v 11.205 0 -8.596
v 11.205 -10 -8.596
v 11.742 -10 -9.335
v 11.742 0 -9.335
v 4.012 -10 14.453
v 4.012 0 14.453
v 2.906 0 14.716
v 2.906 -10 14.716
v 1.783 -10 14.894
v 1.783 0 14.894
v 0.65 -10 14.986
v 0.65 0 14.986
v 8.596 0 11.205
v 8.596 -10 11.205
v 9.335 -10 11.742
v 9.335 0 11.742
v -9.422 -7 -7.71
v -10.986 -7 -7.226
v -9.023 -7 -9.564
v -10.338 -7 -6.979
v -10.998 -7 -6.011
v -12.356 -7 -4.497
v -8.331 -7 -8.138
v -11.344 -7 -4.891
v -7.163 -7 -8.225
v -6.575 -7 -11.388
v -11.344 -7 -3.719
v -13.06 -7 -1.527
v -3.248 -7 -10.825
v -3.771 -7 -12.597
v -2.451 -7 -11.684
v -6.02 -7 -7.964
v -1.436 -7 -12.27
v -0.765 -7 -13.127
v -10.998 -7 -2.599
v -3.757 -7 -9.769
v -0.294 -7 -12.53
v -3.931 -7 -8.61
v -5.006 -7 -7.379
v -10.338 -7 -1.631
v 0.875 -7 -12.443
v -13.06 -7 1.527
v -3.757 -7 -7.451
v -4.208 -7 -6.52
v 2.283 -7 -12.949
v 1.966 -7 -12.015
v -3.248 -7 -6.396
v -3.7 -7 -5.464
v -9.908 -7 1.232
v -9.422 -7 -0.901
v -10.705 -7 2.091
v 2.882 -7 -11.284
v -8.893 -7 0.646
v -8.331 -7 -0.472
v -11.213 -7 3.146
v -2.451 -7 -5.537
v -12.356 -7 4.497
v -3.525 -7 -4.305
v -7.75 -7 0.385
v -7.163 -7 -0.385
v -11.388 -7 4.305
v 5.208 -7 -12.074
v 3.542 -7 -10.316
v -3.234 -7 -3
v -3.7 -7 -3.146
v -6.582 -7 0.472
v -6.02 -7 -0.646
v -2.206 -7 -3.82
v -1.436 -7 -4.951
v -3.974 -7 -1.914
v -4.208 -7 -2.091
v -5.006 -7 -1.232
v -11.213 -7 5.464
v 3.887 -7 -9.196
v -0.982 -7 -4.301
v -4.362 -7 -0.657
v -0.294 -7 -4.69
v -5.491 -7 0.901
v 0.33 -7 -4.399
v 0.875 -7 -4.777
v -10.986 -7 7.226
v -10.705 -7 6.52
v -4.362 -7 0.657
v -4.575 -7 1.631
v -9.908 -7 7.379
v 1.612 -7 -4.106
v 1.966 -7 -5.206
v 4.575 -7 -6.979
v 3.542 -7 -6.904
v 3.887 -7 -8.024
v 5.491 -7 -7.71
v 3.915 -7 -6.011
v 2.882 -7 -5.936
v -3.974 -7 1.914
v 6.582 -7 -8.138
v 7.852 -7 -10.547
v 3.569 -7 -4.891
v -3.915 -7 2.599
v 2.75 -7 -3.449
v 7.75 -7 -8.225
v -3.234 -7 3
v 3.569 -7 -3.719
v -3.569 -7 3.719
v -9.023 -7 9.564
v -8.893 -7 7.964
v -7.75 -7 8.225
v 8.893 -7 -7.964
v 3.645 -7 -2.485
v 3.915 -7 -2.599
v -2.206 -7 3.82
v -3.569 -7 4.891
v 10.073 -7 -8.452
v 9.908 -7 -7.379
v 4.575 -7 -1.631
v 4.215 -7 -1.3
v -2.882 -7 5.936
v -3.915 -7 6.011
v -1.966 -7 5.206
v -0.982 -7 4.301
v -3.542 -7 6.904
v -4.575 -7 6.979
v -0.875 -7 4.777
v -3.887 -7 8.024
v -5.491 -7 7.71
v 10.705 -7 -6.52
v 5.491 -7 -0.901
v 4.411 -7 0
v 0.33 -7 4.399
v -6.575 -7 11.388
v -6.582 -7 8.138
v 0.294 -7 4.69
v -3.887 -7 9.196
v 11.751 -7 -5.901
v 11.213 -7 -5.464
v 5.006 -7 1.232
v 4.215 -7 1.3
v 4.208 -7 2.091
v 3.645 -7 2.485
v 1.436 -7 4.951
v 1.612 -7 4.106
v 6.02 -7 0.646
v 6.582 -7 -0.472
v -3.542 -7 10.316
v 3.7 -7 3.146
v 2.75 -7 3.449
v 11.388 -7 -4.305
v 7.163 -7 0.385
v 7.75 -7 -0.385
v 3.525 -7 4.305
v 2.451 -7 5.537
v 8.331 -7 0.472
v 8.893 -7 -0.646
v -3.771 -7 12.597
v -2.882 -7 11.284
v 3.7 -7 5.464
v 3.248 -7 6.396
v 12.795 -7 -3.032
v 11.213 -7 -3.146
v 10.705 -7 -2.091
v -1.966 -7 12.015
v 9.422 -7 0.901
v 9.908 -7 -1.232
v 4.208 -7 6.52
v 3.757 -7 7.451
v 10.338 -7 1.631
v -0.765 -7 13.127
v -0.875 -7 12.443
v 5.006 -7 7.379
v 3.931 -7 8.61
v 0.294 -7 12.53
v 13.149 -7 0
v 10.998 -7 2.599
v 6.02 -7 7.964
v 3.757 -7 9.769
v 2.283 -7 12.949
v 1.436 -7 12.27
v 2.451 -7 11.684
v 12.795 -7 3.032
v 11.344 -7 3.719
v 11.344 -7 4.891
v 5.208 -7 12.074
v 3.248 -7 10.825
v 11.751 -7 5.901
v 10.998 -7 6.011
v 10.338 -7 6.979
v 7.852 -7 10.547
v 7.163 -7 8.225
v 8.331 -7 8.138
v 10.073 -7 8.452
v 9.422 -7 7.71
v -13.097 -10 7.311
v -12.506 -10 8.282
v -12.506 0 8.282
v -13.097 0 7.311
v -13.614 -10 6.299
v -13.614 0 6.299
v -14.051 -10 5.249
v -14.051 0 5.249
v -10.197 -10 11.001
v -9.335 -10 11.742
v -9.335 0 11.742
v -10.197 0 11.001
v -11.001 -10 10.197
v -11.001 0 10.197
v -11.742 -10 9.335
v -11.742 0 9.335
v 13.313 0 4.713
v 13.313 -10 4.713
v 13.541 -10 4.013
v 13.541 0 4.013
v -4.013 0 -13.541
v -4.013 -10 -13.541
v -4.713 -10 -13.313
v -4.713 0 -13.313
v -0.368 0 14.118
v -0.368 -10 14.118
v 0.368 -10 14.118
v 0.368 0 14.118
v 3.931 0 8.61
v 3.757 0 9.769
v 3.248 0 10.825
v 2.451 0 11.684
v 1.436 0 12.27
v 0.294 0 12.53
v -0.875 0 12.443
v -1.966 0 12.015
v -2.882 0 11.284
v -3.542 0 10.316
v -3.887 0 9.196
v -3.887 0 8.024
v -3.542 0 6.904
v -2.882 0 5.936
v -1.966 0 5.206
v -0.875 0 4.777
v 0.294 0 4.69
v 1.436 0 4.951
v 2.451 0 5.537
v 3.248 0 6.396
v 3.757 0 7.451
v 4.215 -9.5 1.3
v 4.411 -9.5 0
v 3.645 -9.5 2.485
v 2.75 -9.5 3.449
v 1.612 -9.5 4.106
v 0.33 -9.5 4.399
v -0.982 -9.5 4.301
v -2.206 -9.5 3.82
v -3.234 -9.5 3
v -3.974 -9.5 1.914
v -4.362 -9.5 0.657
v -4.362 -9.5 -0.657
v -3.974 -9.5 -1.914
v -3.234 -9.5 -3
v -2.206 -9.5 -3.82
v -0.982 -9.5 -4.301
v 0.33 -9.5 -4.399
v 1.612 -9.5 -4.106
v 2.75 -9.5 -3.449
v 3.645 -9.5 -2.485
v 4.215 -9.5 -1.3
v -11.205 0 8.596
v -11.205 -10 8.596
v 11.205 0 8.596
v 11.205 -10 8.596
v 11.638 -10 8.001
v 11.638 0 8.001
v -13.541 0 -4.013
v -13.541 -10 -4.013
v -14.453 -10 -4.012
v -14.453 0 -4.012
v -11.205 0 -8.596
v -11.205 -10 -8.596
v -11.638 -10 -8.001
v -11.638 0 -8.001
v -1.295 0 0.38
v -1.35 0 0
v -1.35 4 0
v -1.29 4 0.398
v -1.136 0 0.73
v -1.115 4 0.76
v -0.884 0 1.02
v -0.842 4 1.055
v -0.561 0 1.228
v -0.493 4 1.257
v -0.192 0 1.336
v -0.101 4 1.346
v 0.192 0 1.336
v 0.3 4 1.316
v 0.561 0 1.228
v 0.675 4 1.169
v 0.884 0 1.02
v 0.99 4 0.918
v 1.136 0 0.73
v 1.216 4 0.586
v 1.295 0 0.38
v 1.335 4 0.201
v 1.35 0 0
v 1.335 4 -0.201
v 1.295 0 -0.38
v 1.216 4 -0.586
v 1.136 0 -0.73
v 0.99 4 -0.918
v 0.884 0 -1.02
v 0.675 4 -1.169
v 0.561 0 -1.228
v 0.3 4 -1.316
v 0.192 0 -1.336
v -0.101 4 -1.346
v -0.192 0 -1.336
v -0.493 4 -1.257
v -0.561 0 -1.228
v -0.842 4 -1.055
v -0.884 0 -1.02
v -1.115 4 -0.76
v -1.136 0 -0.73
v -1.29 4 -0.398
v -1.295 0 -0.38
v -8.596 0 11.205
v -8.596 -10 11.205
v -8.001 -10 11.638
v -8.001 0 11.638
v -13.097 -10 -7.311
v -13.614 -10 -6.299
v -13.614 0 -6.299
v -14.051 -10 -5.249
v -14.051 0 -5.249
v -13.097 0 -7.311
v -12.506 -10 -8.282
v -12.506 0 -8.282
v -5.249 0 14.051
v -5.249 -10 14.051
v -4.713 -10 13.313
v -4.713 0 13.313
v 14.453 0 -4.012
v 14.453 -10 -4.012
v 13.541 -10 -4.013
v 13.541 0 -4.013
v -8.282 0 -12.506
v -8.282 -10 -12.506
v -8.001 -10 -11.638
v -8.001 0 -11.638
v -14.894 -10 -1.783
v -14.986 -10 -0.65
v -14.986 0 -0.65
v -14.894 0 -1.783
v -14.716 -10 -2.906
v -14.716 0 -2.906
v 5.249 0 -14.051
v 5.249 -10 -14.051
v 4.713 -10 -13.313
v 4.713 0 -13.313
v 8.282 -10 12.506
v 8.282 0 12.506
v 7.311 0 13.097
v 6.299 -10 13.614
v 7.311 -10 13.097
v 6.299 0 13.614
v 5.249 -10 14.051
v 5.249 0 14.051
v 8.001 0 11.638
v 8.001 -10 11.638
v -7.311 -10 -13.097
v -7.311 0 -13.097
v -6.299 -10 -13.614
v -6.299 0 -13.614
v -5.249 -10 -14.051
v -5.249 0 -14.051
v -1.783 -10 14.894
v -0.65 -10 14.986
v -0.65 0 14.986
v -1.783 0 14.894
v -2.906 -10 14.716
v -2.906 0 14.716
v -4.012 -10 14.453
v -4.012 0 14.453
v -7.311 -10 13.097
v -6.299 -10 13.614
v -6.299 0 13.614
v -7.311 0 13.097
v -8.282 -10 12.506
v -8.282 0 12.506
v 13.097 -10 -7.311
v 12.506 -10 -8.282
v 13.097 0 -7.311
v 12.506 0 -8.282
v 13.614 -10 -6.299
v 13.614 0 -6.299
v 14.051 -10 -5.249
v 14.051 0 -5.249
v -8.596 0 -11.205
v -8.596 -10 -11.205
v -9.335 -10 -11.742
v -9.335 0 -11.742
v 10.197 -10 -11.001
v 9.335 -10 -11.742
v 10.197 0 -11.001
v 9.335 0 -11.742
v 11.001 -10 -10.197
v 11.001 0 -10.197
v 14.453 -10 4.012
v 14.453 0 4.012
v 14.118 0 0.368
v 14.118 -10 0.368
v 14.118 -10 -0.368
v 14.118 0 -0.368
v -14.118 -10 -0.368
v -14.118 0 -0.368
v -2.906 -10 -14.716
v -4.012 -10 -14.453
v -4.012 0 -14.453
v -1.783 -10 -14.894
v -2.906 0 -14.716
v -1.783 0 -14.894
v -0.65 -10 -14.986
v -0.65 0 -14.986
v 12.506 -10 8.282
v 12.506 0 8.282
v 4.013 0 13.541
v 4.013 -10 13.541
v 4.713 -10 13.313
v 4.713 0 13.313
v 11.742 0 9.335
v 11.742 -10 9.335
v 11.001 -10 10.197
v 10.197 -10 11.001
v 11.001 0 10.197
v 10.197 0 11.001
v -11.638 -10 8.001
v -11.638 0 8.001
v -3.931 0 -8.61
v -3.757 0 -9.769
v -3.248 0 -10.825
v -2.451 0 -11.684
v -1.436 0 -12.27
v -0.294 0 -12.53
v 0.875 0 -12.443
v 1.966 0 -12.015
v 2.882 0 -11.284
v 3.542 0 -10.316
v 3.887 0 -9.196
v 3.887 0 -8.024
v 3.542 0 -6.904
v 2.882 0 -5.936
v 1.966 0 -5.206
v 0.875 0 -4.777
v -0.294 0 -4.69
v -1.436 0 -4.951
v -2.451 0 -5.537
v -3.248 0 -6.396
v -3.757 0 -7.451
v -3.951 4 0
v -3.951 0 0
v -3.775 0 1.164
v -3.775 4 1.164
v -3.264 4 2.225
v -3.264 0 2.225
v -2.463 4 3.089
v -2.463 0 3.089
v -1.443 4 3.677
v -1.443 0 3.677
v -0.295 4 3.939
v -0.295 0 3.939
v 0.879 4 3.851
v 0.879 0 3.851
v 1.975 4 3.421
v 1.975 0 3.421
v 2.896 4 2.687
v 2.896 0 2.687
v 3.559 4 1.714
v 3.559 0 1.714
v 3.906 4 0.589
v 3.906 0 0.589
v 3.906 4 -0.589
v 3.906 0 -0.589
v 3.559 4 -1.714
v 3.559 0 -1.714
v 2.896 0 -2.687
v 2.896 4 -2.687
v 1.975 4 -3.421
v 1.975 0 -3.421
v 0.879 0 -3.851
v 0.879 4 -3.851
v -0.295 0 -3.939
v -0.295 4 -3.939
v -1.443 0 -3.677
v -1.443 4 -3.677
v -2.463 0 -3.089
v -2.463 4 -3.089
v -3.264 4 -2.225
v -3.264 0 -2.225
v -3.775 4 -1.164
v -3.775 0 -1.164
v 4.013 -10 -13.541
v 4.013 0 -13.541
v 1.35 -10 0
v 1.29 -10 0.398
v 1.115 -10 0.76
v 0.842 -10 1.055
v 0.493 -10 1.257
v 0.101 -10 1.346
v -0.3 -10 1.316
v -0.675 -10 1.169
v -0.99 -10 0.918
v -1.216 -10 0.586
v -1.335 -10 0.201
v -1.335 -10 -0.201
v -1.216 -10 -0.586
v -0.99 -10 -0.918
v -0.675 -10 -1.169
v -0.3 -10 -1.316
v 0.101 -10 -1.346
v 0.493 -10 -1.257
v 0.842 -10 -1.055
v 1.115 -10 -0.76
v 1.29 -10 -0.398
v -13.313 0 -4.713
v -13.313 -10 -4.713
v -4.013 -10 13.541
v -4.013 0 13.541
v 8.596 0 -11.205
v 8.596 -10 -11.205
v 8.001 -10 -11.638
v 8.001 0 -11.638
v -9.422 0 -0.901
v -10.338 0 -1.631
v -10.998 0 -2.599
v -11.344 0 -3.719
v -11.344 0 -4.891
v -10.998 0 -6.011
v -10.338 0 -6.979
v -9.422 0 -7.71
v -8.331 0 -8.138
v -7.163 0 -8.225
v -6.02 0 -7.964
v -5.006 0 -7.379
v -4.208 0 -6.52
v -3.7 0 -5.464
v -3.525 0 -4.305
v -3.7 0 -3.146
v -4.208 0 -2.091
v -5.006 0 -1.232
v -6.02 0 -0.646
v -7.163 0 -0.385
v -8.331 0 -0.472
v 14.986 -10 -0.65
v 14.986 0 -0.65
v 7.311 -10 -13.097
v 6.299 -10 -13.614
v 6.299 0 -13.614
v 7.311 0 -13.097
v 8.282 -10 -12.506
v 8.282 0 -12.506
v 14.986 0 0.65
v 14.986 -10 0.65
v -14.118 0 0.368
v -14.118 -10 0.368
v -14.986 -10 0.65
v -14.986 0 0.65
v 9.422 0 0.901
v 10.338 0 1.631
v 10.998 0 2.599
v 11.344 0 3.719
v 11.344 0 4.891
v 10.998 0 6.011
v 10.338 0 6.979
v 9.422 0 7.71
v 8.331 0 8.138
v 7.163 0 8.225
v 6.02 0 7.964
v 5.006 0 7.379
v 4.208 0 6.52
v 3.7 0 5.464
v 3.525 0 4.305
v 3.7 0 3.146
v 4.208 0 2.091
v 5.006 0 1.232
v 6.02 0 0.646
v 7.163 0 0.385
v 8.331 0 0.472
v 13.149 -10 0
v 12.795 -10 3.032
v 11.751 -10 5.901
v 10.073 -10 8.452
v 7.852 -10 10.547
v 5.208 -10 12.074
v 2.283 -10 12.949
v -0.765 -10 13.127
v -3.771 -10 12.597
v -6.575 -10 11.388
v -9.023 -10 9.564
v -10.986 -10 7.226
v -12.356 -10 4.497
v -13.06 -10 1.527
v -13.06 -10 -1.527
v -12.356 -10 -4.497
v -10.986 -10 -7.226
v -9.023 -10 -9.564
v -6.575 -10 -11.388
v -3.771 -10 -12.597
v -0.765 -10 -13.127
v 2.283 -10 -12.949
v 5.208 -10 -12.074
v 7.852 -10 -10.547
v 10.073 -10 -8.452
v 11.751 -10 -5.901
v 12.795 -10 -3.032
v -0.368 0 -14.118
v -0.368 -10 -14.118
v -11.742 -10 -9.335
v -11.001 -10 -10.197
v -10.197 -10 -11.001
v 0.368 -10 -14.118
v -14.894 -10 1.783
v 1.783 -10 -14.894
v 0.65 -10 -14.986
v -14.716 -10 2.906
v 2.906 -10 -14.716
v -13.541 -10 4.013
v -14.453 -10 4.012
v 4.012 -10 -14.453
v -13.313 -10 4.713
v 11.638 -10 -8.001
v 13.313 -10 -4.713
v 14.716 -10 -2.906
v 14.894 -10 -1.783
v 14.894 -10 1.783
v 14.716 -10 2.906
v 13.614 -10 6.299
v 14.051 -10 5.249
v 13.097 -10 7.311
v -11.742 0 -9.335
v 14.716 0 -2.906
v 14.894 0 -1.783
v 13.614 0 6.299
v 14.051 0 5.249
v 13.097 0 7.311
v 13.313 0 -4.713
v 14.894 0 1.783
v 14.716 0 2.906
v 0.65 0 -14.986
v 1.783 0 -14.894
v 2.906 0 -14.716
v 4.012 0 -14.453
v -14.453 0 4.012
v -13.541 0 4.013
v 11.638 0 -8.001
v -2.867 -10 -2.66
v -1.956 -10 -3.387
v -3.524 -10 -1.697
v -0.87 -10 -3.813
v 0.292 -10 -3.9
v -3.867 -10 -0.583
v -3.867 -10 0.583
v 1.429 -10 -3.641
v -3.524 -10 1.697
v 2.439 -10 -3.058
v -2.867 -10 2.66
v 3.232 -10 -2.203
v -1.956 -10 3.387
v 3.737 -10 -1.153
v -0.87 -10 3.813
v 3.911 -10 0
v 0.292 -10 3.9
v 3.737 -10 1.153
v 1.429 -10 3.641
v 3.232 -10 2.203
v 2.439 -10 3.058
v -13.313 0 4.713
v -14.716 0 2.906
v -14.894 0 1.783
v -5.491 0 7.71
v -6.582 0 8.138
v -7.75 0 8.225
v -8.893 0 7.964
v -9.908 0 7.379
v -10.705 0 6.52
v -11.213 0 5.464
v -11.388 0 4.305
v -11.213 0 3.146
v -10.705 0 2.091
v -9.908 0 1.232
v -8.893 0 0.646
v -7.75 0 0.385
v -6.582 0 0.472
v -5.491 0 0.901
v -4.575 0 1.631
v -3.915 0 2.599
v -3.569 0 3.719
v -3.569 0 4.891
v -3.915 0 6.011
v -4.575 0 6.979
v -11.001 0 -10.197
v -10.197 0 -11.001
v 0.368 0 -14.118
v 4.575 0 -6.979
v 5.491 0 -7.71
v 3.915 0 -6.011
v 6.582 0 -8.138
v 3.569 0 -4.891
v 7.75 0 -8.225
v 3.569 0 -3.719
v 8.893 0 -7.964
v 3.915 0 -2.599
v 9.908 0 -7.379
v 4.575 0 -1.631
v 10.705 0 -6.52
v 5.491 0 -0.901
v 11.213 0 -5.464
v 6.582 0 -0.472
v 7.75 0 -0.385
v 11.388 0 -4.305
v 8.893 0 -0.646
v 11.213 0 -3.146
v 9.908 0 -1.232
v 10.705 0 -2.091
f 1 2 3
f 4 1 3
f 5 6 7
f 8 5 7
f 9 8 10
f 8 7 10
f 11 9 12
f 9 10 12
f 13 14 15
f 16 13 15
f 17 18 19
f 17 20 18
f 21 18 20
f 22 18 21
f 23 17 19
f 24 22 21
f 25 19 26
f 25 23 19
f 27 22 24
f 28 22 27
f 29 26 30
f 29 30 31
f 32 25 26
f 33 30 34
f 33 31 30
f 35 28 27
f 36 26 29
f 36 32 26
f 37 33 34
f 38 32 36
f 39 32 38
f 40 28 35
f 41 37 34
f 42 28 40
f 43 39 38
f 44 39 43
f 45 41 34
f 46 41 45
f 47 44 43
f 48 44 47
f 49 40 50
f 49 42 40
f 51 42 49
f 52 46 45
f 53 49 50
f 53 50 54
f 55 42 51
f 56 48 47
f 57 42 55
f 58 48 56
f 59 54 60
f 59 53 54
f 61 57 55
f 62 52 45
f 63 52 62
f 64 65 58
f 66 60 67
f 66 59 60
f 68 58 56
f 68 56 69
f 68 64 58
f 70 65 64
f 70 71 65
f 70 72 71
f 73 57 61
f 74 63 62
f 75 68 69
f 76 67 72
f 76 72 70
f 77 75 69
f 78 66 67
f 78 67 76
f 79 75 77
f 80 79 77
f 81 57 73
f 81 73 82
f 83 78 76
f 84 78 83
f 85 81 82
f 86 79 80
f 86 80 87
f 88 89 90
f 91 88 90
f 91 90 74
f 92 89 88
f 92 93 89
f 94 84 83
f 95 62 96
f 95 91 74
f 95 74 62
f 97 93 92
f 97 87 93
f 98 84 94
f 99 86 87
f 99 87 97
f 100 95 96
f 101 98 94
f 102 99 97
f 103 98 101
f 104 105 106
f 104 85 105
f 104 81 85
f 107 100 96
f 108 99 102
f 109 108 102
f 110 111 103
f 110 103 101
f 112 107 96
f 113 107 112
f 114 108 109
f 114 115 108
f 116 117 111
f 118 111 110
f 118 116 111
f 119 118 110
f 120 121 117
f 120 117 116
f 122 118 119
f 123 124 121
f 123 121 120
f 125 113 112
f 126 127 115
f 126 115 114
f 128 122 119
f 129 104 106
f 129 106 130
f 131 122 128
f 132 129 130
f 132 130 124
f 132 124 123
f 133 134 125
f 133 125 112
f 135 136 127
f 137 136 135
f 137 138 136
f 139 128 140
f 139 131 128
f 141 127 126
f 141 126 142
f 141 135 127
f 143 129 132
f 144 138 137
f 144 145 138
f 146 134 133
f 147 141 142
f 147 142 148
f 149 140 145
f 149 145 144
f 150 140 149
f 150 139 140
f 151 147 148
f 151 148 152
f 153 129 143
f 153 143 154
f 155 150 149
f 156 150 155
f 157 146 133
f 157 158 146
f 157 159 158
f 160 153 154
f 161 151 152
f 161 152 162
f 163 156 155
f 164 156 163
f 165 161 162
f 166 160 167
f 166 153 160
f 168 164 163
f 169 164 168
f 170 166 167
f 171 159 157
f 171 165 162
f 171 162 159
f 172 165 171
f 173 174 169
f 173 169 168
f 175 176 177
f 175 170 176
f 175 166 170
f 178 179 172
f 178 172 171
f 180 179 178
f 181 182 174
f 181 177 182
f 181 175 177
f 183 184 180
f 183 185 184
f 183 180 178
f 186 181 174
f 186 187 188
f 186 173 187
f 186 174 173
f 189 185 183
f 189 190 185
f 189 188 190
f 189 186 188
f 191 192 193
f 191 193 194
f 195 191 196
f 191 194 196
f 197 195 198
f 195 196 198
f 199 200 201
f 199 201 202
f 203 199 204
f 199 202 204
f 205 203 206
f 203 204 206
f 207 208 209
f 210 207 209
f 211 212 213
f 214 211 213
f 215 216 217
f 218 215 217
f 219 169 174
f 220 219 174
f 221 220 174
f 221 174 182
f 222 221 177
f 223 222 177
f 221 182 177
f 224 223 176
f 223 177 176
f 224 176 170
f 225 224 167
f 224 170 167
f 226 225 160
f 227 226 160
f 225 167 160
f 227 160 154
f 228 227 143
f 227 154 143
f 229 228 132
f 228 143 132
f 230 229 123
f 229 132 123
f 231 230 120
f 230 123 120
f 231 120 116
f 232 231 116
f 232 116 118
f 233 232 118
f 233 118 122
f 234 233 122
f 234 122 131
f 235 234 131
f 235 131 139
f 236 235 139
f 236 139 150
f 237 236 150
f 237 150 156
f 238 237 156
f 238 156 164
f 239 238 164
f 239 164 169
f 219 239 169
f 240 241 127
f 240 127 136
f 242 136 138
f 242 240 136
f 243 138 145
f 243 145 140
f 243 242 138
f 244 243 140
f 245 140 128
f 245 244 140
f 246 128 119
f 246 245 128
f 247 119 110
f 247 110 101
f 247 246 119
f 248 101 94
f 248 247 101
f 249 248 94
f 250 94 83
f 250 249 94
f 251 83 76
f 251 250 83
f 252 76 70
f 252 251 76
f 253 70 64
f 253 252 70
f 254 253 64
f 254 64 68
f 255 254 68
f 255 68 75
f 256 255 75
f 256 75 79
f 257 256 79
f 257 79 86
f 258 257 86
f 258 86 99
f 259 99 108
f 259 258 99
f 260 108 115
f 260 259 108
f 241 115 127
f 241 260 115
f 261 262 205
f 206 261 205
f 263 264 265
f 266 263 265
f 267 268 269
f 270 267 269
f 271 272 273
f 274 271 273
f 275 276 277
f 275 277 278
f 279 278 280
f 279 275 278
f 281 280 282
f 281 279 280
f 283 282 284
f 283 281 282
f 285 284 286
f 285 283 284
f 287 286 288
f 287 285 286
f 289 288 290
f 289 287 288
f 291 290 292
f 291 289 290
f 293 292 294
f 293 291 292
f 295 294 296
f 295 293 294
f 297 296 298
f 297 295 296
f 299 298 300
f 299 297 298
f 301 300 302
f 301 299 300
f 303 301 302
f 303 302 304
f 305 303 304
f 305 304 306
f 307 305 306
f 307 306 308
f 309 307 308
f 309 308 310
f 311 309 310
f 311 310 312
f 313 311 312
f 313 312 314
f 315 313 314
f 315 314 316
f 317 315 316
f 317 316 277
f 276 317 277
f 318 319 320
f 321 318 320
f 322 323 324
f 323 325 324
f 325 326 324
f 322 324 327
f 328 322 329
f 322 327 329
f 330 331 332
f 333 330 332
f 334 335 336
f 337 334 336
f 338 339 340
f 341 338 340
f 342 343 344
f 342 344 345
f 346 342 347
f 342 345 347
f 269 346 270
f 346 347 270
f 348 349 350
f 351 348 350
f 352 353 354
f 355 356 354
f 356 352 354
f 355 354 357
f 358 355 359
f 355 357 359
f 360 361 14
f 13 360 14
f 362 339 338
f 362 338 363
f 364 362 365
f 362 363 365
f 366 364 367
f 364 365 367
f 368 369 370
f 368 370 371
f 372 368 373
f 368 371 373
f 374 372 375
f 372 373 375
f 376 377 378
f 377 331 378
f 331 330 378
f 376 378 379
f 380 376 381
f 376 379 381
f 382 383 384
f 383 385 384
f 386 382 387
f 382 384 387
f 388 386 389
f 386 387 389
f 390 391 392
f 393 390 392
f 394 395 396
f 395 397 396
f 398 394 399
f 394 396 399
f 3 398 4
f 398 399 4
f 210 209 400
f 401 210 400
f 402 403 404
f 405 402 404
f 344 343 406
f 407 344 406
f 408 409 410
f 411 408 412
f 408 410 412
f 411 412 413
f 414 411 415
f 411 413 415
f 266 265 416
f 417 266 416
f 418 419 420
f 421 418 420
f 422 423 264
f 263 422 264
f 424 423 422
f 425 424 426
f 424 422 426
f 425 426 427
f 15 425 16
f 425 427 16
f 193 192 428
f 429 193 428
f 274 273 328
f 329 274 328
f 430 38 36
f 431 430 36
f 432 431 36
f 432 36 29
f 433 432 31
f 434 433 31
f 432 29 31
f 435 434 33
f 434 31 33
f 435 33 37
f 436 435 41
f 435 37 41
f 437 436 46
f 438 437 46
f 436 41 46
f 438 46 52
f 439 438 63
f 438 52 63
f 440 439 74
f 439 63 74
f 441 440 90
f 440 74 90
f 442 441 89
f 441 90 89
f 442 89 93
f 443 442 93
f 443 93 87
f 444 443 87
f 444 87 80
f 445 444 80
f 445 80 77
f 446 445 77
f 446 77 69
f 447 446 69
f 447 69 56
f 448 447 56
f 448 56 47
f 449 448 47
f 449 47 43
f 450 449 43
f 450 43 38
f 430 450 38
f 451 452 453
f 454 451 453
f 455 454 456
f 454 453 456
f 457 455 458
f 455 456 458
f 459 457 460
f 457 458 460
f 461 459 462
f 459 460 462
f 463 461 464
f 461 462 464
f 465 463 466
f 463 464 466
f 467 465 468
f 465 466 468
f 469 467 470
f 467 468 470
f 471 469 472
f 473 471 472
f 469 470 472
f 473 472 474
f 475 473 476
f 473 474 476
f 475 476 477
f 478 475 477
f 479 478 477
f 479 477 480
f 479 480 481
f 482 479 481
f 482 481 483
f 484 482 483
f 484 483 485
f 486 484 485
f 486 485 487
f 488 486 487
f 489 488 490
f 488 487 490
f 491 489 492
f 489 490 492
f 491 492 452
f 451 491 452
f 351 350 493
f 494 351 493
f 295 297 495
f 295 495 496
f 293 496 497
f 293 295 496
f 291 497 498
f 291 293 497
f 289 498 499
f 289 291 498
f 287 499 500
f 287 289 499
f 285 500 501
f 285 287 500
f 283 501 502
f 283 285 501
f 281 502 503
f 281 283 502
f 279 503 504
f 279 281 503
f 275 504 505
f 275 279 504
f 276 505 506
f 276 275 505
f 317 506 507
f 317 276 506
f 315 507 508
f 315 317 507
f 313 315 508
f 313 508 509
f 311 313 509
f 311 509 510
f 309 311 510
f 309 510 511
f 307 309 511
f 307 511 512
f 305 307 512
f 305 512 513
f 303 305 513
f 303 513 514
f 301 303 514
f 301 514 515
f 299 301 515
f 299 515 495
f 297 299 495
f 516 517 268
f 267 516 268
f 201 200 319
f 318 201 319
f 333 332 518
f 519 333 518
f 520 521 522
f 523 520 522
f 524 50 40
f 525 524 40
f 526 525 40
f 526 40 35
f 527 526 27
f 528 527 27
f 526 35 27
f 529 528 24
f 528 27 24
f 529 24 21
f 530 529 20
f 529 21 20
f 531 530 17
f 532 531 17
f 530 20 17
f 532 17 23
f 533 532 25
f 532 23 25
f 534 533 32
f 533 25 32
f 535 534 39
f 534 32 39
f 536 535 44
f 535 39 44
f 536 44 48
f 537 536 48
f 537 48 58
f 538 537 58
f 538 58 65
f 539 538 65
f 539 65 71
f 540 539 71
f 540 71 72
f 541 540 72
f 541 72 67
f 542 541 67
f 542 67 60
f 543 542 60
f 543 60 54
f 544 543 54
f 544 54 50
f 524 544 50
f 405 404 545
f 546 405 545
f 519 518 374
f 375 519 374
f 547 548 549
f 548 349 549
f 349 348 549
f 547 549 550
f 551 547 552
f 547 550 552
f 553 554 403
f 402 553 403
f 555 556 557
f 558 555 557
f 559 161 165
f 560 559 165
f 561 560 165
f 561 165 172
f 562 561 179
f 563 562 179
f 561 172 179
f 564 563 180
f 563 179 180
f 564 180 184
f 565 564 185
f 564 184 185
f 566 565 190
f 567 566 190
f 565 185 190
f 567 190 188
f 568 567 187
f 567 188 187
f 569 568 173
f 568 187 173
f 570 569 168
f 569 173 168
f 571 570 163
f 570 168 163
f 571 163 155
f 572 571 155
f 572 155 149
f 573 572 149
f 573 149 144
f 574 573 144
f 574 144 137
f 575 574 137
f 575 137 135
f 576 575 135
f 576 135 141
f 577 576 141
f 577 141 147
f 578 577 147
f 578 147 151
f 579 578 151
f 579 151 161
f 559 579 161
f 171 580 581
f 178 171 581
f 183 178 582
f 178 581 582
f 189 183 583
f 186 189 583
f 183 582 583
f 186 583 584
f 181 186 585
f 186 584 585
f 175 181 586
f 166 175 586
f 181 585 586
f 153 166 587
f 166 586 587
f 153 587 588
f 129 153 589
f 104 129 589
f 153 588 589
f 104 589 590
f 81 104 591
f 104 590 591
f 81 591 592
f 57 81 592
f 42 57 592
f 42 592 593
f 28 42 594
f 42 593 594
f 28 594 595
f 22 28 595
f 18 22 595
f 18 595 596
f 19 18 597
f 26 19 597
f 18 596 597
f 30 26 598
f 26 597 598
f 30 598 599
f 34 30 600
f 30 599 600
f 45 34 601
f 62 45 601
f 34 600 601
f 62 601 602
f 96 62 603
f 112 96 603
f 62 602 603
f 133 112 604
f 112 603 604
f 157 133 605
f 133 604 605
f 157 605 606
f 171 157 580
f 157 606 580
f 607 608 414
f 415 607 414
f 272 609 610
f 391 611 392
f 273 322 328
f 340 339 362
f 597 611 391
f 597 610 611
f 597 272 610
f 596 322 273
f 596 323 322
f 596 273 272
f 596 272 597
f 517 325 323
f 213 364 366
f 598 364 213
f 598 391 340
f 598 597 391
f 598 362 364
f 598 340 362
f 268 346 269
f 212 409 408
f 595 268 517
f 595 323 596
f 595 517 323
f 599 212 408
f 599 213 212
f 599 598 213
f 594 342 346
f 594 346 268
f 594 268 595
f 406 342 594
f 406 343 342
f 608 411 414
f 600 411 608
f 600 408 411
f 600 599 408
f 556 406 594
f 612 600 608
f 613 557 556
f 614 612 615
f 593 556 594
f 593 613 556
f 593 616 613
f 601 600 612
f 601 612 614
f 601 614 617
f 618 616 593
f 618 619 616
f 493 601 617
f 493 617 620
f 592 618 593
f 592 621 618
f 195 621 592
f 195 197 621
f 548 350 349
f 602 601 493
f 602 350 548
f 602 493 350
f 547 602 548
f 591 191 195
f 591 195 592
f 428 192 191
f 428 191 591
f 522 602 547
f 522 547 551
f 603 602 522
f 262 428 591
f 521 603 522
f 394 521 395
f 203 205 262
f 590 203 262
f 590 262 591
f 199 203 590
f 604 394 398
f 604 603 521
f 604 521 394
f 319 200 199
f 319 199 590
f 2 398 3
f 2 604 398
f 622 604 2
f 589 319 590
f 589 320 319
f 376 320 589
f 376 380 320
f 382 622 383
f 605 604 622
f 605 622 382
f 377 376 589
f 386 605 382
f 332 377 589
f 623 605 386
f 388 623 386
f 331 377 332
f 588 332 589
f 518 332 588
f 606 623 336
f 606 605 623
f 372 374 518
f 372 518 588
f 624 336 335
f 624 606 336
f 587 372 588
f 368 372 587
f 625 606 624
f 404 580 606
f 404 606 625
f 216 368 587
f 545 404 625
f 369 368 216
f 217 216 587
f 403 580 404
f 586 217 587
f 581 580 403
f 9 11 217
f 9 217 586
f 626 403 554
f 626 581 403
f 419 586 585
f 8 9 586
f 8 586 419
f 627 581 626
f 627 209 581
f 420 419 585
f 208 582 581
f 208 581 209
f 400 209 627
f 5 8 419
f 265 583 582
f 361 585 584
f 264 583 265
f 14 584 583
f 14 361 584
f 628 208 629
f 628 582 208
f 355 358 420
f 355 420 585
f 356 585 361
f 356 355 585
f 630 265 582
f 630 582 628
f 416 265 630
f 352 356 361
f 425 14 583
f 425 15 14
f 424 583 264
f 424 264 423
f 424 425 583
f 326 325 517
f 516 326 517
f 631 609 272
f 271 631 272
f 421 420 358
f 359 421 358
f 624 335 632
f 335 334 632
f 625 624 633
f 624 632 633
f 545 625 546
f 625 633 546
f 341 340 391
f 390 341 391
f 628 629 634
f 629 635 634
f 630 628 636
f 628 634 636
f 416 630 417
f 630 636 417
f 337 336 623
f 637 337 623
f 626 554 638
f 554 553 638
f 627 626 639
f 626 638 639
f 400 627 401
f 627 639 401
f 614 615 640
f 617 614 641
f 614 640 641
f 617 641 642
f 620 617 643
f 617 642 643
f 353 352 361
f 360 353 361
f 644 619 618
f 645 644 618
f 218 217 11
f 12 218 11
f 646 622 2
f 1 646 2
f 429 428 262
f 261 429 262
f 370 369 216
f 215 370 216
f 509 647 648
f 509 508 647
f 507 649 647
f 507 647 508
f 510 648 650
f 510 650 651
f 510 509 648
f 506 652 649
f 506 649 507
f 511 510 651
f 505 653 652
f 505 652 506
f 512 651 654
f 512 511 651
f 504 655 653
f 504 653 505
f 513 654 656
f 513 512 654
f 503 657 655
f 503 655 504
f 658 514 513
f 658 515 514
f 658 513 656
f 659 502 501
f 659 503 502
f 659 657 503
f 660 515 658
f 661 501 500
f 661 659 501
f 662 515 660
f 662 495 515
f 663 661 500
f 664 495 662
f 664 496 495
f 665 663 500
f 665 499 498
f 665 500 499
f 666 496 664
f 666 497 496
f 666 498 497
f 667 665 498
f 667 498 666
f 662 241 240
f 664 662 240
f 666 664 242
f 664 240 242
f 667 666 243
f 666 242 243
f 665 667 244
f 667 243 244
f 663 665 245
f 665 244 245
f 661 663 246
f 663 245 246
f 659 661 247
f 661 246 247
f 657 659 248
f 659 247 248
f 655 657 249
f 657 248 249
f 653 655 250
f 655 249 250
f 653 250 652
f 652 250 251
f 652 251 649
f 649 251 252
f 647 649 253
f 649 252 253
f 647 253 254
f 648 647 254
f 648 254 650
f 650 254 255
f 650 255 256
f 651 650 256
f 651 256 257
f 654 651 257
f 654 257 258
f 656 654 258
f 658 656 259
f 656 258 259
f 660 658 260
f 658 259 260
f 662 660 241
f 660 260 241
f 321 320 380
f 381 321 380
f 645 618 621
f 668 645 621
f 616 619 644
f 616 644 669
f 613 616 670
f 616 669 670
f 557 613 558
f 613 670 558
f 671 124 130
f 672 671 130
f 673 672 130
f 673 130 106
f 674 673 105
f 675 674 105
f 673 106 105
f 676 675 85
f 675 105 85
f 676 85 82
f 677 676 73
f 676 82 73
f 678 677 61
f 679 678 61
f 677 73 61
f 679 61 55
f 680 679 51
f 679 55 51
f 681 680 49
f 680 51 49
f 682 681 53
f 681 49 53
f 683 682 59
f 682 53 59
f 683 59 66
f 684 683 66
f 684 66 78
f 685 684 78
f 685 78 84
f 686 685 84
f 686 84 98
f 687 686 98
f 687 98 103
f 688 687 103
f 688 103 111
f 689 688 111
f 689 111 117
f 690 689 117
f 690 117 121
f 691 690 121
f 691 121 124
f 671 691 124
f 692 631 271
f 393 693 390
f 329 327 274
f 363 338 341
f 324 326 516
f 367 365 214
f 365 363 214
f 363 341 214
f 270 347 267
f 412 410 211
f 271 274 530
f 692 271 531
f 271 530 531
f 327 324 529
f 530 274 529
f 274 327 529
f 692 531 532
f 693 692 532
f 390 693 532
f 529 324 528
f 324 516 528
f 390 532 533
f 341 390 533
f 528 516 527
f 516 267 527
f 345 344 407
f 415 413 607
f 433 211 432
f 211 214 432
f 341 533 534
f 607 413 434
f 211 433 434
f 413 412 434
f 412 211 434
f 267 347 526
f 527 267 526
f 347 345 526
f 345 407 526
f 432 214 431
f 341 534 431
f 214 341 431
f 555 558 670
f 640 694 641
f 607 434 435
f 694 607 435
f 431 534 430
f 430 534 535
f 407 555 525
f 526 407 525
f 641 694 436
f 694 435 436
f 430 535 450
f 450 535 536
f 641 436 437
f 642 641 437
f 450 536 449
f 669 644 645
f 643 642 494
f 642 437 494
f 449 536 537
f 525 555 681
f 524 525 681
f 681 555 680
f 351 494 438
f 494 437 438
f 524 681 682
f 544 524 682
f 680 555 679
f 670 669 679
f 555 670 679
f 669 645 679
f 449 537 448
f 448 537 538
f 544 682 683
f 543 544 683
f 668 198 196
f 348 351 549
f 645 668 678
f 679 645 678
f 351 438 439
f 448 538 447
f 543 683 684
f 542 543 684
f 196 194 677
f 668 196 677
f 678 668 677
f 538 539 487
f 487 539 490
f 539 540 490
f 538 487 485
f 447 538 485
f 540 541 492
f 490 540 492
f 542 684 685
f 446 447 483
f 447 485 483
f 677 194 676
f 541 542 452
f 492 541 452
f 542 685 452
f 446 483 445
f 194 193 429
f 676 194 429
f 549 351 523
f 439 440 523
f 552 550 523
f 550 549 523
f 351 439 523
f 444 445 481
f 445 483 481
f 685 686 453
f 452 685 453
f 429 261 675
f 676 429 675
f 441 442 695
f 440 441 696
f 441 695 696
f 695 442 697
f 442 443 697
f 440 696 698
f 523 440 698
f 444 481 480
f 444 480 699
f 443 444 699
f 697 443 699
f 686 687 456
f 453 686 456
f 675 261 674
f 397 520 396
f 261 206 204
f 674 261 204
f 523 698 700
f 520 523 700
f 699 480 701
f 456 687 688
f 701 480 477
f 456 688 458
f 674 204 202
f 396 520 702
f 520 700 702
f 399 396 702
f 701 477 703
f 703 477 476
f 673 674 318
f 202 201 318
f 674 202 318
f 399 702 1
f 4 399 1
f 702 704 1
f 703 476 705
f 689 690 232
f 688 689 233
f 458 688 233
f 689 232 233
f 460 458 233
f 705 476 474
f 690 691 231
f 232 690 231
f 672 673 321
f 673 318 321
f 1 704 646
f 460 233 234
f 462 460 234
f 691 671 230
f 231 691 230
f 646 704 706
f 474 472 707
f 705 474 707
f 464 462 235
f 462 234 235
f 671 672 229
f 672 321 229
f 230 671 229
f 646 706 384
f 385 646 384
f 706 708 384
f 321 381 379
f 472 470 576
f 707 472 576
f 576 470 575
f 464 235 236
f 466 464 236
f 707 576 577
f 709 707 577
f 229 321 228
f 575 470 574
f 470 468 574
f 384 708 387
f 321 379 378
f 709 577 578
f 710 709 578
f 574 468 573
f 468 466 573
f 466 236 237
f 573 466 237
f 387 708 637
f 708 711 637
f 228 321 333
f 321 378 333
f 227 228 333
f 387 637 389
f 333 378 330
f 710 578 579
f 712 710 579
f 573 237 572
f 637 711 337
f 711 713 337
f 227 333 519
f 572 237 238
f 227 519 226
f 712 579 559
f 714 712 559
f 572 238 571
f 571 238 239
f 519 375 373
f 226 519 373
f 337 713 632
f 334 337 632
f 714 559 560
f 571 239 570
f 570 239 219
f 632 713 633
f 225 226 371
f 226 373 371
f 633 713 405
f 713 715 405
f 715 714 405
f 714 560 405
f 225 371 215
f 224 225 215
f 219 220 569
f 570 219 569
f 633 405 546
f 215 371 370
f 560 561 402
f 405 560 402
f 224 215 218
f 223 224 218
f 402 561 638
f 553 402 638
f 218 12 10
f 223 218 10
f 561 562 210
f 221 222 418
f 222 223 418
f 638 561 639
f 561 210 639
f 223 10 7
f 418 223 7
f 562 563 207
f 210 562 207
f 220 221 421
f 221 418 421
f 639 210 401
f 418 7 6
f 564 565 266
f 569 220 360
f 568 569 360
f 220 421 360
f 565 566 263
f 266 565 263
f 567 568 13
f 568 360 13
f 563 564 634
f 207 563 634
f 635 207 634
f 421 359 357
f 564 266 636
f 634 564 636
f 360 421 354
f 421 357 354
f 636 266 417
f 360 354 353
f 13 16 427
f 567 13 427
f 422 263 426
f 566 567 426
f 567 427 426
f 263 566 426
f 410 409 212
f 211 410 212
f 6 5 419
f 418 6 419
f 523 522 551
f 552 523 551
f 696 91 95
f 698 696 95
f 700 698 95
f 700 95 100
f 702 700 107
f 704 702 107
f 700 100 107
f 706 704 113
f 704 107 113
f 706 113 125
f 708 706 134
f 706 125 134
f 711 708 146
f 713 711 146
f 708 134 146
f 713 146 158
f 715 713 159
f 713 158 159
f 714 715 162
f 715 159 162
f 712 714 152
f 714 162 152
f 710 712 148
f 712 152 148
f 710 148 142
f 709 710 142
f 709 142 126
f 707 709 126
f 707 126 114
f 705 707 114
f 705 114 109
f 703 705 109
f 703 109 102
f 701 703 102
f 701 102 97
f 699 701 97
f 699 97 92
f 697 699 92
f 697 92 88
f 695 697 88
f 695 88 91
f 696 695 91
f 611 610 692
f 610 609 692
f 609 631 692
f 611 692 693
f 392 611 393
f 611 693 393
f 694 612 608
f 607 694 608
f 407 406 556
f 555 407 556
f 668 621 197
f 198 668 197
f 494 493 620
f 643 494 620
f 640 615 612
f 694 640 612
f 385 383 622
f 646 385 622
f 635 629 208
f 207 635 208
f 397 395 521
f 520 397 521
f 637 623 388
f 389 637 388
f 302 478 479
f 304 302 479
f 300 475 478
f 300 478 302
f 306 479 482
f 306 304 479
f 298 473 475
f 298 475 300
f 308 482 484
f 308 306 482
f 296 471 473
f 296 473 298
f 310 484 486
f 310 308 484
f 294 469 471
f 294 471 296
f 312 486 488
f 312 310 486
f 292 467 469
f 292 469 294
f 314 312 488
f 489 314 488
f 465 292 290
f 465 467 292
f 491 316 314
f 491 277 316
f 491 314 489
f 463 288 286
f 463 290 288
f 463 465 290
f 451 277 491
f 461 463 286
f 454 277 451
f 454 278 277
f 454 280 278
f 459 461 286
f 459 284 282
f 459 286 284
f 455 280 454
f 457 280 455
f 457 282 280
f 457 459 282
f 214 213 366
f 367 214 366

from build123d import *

# Parameters (mm, degrees)
F0_R            = 15
F0_R_2          = 1.35
F1_DEPTH        = 10
F3_R            = 3.9311890732
F4_DEPTH        = 25
F4_COPIES_COUNT = 6
F2_R            = 13.1491583338
F2_R_2          = 4.4111200255
F5_DEPTH        = 3
F6_SIZE         = 0.5
F8_DEPTH        = 10
F9_COUNT        = 20
F10_R           = 3.9505307448
F10_R_2         = 1.35
F11_DEPTH       = 4


# Not quite as in the source:
# - a pattern or mirror of a feature is missing from the dataset's text; its kind, count and spacing are read off the source's solid
# - a feature names something its author has since deleted; it is built from what else it names


with BuildPart() as f1:
    # F0 (on Front) → F1 (new body)
    with BuildSketch(Plane.XZ):
        Circle(F0_R)
        Circle(F0_R_2, mode=Mode.SUBTRACT)
    extrude(amount=F1_DEPTH)

    # F3 (on face) → F4 (cut)
    with BuildSketch(Plane.XZ.offset(10)):
        with Locations((0, 8.6101097986)):
            Circle(F3_R)
    f4 = extrude(amount=-F4_DEPTH, mode=Mode.SUBTRACT)

    # F4_copies: F4 ×6 about axis
    f4_copies_axis = Axis((0, 0, 0), (0, 1, 0))
    for i in range(1, F4_COPIES_COUNT):
        add(f4.rotate(f4_copies_axis, i * 360 / F4_COPIES_COUNT), mode=Mode.SUBTRACT)

    # F2 (on face) → F5 (cut)
    with BuildSketch(Plane.XZ.offset(10)):
        Circle(F2_R)
        Circle(F2_R_2, mode=Mode.SUBTRACT)
    extrude(amount=-F5_DEPTH, mode=Mode.SUBTRACT)

    # F6
    f6_edges = [f1.edges().sort_by_distance(p)[0] for p in [
        (-4.41112, -10, 0),
    ]]
    chamfer(f6_edges, length=F6_SIZE)

    # F7 (on face) → F8 (cut)
    with BuildSketch(Plane.XZ.offset(10)):
        with BuildLine():
            ThreePointArc((0.6504242485, 14.9858916417), (0, 15), (-0.6504242485, 14.9858916417))
            Line((-0.6504242485, 14.9858916417), (-0.3680477384, 14.1178695485))
            Line((-0.3680477384, 14.1178695485), (0, 14.1178695485))
            Line((0, 14.1178695485), (0.3680477384, 14.1178695485))
            Line((0.3680477384, 14.1178695485), (0.6504242485, 14.9858916417))
        make_face()
    f8 = extrude(amount=-F8_DEPTH, mode=Mode.SUBTRACT)

    # F9: F8 ×20 about axis
    f9_axis = Axis((0, 0, 0), (0, 1, 0))
    for i in range(1, F9_COUNT):
        add(f8.rotate(f9_axis, i * 360 / F9_COUNT), mode=Mode.SUBTRACT)

    # F10 (on face) → F11 (join)
    with BuildSketch(Plane(origin=(0, 0, 0), x_dir=(-1, 0, 0), z_dir=(0, 1, 0))):
        Circle(F10_R)
        Circle(F10_R_2, mode=Mode.SUBTRACT)
    extrude(amount=F11_DEPTH)


solid = f1.part
